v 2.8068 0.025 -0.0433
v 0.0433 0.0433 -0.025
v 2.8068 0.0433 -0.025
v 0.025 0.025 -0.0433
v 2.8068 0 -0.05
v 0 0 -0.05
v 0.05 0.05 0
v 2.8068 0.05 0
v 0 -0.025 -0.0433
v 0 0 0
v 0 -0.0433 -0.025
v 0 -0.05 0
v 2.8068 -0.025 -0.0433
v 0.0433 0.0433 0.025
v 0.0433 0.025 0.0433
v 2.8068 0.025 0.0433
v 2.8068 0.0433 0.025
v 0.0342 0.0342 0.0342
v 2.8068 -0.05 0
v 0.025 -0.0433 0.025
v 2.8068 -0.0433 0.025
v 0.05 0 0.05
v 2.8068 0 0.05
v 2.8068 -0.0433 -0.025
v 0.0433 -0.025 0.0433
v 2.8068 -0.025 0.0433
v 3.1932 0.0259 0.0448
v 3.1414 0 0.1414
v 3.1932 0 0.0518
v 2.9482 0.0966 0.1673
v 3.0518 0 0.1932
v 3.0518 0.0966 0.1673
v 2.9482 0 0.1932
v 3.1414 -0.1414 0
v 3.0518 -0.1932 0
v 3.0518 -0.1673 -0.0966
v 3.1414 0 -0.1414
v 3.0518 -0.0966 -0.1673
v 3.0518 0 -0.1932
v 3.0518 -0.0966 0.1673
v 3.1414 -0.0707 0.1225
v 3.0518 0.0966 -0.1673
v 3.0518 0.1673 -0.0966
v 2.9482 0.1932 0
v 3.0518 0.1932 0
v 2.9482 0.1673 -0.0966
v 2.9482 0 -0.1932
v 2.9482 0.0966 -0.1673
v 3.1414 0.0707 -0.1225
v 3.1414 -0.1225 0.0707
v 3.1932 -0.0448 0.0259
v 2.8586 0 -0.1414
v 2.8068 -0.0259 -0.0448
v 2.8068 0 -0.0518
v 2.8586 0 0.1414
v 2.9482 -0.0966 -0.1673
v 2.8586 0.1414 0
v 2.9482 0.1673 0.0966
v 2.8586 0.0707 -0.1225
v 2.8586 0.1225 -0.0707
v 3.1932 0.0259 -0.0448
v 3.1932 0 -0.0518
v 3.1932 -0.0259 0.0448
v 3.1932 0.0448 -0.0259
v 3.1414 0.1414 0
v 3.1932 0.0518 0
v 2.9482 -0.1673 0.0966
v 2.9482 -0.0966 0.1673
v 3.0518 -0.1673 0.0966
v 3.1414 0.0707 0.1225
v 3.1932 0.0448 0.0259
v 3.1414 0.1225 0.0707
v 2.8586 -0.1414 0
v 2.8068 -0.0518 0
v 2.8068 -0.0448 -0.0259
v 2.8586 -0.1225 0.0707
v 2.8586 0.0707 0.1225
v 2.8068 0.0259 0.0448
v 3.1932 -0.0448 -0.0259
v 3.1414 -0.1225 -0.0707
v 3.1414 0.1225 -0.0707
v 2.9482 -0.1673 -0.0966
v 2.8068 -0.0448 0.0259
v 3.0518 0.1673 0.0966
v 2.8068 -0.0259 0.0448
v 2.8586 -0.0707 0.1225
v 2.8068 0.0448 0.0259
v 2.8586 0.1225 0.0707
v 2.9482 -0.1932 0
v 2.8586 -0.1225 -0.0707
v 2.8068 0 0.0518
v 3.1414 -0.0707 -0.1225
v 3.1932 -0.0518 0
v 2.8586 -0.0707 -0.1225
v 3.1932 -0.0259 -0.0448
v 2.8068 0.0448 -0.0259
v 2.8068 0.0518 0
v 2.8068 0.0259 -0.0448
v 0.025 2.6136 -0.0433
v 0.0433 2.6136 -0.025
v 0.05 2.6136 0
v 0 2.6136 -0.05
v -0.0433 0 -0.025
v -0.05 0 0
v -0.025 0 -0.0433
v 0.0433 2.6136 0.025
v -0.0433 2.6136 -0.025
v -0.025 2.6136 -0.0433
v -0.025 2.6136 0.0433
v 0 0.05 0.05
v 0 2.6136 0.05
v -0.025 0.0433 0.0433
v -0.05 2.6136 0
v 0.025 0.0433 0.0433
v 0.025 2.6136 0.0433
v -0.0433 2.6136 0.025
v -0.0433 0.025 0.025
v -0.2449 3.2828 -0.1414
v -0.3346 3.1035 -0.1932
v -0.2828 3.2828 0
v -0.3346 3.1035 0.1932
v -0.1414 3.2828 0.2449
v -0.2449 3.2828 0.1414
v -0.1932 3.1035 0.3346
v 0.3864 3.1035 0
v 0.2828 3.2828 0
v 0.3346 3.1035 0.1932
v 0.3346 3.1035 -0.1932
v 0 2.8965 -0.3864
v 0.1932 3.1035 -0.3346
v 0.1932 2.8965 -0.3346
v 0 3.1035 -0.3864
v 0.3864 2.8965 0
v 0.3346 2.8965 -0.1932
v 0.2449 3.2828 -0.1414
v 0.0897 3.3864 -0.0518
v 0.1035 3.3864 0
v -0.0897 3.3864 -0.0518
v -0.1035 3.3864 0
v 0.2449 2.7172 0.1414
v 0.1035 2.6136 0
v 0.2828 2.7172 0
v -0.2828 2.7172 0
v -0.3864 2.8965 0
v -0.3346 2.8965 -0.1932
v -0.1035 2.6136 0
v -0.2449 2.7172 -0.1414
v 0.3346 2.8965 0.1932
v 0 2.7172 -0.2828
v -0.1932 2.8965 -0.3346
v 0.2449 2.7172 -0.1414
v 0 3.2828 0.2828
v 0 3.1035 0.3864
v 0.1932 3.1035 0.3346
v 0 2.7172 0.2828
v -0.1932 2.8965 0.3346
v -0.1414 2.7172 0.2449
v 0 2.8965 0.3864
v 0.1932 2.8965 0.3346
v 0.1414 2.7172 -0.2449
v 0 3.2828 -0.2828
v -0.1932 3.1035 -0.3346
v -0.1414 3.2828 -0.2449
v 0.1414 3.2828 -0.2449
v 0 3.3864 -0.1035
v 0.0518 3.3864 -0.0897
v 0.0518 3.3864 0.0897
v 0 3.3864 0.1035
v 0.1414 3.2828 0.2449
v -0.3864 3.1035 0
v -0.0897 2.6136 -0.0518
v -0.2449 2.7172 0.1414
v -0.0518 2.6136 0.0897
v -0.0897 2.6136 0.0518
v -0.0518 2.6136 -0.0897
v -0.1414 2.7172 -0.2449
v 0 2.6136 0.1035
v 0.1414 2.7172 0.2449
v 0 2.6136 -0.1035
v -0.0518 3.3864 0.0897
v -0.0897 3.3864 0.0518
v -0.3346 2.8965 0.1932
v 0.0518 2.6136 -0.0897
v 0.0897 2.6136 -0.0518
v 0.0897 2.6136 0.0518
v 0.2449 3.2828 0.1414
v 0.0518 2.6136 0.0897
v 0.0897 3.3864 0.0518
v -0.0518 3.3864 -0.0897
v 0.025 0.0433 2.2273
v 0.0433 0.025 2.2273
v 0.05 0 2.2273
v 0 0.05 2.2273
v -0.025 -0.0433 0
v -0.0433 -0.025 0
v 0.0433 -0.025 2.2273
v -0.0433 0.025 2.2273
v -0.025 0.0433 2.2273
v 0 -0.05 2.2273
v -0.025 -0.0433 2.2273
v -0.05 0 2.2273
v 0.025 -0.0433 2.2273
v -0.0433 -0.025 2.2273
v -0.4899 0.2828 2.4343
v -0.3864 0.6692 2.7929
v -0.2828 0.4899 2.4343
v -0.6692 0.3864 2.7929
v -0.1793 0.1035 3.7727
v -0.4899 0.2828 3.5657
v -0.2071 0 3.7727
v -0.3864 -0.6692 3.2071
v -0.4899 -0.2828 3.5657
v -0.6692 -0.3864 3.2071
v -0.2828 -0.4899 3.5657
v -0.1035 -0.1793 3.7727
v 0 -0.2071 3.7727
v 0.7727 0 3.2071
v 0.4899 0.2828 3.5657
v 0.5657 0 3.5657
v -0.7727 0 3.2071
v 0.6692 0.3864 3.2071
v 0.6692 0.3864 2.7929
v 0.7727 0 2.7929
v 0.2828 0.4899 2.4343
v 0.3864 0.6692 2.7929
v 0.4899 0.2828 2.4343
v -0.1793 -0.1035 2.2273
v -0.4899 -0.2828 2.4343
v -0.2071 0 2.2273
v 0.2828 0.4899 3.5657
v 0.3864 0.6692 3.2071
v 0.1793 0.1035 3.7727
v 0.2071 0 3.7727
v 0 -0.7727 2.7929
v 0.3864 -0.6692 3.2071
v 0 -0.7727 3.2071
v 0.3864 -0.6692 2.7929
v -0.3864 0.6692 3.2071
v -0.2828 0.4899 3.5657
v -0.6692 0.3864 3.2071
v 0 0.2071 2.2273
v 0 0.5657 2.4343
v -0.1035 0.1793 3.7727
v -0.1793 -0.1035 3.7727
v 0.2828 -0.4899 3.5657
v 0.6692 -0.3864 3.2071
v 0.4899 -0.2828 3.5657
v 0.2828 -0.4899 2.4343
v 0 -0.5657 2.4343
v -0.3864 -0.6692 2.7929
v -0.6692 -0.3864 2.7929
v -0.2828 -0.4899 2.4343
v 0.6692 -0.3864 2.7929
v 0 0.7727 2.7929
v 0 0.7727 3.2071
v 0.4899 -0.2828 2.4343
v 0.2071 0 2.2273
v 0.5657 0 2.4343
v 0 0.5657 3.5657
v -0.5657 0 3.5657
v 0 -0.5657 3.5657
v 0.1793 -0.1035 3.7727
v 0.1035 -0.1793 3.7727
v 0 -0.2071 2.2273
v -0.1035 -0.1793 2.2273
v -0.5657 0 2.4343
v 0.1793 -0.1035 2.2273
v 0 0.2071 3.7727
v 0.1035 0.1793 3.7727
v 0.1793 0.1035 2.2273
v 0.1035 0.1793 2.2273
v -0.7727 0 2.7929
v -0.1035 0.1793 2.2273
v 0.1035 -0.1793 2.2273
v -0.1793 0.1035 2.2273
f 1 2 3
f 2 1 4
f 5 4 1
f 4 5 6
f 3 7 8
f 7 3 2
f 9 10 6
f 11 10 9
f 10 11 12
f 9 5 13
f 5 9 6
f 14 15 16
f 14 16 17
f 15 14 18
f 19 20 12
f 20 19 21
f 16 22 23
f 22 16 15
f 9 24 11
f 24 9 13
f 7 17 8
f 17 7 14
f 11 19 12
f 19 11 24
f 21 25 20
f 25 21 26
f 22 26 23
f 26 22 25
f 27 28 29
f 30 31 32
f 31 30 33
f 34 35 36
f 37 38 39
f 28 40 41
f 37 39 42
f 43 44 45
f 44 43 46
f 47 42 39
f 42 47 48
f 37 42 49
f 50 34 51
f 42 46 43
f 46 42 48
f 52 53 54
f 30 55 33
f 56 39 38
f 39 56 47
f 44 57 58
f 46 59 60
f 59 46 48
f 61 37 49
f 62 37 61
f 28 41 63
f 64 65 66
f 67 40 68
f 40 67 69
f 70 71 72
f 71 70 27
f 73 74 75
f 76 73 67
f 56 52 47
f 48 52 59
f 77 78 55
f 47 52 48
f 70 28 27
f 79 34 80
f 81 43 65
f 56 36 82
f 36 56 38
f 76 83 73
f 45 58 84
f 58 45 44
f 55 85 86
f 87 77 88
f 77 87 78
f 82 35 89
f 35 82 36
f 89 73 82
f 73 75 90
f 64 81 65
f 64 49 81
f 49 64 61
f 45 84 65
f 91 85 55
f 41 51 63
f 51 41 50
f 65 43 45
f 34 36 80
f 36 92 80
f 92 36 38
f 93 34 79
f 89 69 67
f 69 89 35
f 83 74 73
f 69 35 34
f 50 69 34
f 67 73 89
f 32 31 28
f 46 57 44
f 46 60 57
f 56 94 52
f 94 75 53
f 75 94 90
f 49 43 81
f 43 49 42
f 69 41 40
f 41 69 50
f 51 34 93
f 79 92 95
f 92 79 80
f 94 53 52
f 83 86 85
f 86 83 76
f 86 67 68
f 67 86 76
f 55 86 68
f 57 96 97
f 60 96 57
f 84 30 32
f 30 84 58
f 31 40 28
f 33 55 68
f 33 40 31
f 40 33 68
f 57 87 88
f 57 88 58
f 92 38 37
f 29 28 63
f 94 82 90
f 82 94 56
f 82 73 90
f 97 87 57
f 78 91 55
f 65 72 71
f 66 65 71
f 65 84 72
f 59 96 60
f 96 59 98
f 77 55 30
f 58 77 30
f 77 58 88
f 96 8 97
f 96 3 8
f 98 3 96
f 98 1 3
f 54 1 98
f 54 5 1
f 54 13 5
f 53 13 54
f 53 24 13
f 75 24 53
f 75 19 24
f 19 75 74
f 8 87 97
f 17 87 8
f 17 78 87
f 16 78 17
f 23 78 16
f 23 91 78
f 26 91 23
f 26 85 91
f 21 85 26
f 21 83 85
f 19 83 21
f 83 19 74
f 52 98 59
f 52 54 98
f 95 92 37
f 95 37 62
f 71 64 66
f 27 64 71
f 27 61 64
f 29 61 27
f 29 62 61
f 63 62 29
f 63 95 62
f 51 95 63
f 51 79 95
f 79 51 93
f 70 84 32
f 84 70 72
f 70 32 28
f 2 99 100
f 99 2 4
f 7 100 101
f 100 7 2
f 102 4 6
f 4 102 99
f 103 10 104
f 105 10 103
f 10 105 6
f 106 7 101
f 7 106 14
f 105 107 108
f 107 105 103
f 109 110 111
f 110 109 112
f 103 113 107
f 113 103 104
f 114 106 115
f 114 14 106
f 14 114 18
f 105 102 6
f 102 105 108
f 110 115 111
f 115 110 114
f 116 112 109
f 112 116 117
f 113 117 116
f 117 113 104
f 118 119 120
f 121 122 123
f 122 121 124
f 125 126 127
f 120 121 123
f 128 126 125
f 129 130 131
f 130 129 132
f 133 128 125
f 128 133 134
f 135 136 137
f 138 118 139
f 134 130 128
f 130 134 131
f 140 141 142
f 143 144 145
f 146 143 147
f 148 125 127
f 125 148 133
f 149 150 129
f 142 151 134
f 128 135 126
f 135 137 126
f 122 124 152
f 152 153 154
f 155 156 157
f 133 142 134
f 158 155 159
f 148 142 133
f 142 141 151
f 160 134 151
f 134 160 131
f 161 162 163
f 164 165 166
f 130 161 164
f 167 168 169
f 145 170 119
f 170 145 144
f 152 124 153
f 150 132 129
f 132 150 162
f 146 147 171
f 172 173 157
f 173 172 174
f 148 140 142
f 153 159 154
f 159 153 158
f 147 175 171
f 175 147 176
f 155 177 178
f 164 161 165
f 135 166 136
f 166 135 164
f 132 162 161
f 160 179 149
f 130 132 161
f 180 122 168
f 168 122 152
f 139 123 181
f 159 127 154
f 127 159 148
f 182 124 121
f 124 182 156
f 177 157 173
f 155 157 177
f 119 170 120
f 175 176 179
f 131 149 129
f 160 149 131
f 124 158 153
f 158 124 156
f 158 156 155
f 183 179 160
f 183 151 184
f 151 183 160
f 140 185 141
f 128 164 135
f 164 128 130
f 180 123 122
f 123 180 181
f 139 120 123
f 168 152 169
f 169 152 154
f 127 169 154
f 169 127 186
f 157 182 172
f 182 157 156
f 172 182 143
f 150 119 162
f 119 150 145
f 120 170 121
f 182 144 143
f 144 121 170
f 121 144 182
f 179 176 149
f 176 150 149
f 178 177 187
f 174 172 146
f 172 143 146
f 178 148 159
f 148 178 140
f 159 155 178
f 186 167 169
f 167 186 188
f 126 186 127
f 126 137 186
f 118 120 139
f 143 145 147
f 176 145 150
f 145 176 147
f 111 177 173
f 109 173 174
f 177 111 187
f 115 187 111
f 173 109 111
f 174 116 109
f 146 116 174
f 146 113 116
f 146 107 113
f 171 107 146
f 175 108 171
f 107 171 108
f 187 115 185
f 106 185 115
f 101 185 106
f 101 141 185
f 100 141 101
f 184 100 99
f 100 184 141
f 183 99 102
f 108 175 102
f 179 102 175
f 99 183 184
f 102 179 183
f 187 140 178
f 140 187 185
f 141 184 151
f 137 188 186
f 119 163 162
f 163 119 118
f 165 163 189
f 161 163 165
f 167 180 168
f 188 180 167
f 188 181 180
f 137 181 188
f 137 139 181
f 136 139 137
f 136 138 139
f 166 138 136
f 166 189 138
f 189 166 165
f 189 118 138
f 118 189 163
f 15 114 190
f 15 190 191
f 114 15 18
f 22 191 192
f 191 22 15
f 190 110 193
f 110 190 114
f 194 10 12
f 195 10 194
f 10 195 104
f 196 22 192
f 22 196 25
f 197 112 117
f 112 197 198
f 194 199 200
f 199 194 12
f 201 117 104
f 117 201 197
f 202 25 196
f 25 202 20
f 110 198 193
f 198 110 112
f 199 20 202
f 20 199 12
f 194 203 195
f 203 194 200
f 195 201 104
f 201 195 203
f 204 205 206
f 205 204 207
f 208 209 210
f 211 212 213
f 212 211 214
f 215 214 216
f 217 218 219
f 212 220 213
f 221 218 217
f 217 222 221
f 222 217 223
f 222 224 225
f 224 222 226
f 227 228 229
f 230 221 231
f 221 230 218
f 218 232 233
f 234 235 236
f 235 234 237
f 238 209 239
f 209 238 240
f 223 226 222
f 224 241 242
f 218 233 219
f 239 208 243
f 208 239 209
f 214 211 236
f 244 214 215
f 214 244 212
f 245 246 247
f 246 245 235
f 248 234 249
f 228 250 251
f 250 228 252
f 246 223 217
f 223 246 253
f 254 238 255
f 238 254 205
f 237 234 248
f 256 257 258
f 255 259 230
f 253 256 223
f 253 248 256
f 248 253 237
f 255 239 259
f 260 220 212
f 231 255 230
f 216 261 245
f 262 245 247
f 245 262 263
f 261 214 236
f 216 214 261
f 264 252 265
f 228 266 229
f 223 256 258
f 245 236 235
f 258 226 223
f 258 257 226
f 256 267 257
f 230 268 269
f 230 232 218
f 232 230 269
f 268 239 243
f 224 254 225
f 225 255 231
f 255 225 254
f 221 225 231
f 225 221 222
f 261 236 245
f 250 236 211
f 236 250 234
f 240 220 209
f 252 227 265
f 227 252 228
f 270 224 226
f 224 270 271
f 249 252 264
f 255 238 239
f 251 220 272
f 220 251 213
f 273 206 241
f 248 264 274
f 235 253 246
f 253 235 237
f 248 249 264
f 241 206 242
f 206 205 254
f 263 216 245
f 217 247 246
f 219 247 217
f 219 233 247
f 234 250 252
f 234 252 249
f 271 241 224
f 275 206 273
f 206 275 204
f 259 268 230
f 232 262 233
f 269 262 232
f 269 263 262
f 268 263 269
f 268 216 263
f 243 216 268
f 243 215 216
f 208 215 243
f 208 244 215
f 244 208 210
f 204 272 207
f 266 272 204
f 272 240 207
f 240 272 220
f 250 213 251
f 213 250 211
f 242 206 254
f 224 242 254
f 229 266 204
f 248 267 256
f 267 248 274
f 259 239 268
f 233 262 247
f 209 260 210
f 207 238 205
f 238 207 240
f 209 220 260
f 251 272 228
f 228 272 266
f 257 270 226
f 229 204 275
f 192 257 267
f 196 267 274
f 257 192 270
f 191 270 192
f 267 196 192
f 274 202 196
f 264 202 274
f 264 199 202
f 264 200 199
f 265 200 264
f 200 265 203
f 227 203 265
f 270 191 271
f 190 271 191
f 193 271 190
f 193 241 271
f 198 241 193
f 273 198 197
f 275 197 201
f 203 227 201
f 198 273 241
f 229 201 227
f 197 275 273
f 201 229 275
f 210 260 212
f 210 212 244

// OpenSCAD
axis_radius = 0.05;
axis_length = 3.0;

rotate([0, 90, 0]) {
    color([1, 0, 0]) {
        translate([0, 0, axis_length/2]) {
            cylinder(h=axis_length, r1=axis_radius, r2=axis_radius, center=true, $fn=12);
        }
        translate([0, 0, axis_length]) {
            sphere(r = 0.2, $fn=12);
        }
    }
}


rotate([-90, 0, 0]) {
    color([0, 1, 0]) {
        translate([0, 0, axis_length/2]) {
            cylinder(h=axis_length, r1=axis_radius, r2=axis_radius, center=true, $fn=12);
        }
        translate([0, 0, axis_length]) {
            sphere(r = 0.4, $fn=12);
        }
    }
}


rotate([0, 0, 0]) {
    color([0, 0, 1]) {
        translate([0, 0, axis_length/2]) {
            cylinder(h=axis_length, r1=axis_radius, r2=axis_radius, center=true, $fn=12);
        }
        translate([0, 0, axis_length]) {
            sphere(r = 0.8, $fn=12);
        }
    }
}
